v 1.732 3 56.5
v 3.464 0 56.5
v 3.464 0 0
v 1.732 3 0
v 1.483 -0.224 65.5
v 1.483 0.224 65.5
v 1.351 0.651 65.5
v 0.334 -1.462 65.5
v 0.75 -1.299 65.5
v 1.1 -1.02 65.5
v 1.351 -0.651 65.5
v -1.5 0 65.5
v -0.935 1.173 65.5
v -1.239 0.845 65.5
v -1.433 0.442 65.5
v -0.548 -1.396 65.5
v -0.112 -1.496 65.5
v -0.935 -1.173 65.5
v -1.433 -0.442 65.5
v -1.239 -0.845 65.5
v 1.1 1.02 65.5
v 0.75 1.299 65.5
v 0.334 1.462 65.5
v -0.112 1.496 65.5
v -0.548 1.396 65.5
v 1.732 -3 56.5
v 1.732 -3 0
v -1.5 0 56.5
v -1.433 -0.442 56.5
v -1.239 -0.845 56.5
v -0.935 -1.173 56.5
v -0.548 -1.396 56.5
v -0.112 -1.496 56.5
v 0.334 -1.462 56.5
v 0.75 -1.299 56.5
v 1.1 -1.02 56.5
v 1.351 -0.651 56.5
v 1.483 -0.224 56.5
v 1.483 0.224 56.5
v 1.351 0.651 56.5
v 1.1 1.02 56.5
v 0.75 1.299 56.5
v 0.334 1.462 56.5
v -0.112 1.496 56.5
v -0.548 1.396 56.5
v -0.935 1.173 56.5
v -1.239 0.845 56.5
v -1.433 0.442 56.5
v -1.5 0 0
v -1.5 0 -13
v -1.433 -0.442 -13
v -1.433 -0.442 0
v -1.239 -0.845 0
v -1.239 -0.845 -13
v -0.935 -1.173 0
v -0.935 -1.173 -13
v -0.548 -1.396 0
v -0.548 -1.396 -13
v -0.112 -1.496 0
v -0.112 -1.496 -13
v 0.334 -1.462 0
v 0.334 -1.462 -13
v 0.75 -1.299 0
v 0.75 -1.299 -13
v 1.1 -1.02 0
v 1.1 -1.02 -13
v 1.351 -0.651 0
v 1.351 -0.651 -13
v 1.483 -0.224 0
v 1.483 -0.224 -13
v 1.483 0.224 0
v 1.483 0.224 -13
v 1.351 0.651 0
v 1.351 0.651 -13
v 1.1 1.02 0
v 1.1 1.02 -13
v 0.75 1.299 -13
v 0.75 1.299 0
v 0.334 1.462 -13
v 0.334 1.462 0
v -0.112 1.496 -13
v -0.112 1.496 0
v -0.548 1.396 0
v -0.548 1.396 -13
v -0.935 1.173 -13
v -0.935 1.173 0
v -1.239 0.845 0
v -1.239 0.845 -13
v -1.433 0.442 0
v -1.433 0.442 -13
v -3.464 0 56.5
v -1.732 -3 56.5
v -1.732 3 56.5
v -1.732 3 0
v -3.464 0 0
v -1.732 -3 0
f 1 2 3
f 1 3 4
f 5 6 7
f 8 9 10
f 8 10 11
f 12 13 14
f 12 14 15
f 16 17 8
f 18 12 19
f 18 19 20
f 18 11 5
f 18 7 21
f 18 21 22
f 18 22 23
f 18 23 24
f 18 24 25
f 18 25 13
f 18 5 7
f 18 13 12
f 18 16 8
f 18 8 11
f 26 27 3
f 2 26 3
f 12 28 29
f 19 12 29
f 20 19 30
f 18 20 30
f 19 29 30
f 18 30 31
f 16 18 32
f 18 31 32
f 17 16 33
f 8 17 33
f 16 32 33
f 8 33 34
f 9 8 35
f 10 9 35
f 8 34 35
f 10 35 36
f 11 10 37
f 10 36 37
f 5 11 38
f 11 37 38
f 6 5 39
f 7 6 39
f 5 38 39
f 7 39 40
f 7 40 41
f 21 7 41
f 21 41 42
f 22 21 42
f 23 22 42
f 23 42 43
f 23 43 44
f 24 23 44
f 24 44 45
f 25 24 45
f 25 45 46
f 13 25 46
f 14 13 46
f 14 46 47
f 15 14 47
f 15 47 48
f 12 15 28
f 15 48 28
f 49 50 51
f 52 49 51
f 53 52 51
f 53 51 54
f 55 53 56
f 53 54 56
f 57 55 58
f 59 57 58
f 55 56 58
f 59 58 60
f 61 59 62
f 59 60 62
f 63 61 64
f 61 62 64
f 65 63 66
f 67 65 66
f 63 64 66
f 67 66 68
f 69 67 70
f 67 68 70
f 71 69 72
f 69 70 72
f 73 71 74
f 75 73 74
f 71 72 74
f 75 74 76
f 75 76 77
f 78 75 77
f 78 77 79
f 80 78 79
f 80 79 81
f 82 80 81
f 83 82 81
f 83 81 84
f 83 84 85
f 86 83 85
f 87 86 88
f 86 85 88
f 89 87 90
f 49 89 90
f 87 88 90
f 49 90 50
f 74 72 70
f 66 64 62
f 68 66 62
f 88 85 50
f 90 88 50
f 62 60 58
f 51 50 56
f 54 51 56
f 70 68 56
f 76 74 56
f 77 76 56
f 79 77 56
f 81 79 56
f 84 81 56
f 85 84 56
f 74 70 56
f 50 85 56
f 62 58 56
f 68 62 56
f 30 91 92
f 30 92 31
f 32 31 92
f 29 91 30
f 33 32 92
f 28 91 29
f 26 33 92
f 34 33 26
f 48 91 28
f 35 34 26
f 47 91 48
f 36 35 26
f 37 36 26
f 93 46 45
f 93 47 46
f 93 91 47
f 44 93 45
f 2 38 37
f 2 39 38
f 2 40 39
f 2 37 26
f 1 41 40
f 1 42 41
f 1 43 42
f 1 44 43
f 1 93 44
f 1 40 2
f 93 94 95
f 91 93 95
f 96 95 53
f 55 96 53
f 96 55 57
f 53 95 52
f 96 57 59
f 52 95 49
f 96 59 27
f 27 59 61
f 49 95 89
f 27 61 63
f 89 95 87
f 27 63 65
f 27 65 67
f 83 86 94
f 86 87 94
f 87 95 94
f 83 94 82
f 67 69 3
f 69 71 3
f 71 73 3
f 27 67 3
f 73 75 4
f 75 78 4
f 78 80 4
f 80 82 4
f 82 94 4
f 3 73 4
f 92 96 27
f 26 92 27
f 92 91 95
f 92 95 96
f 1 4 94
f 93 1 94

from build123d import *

# Parameters (mm, degrees)
EXTRUDE_56_5_DEPTH  = 56.5
EXTRUDE_START       = -13
SKETCH_2_R          = 1.5
EXTRUDE_M3_13_DEPTH = 13
EXTRUDE_START_2     = 56.5
SKETCH_3_R          = 1.5
EXTRUDE_M3_9_DEPTH  = 9


with BuildPart() as part:
    # 草图1 → 六角柱_有效长56.5 (new body)
    with BuildSketch(Plane.XY):
        Polygon((3.464101615, 0), (1.732050808, 3), (-1.732050808, 3), (-3.464101615, 0), (-1.732050808, -3), (1.732050808, -3), align=None)
    extrude(amount=EXTRUDE_56_5_DEPTH)

    # 草图2 → 下端M3公头_长13 (add)
    with BuildSketch(Plane.XY.offset(EXTRUDE_START)):
        with Locations(Location((0, 0, 0), (0, 0, 180))):
            Circle(SKETCH_2_R)
    extrude(amount=EXTRUDE_M3_13_DEPTH)

    # 草图3 → 上端M3公头_长9 (add)
    with BuildSketch(Plane.XY.offset(EXTRUDE_START_2)):
        with Locations(Location((0, 0, 0), (0, 0, 180))):
            Circle(SKETCH_3_R)
    extrude(amount=EXTRUDE_M3_9_DEPTH)


solid = part.part
